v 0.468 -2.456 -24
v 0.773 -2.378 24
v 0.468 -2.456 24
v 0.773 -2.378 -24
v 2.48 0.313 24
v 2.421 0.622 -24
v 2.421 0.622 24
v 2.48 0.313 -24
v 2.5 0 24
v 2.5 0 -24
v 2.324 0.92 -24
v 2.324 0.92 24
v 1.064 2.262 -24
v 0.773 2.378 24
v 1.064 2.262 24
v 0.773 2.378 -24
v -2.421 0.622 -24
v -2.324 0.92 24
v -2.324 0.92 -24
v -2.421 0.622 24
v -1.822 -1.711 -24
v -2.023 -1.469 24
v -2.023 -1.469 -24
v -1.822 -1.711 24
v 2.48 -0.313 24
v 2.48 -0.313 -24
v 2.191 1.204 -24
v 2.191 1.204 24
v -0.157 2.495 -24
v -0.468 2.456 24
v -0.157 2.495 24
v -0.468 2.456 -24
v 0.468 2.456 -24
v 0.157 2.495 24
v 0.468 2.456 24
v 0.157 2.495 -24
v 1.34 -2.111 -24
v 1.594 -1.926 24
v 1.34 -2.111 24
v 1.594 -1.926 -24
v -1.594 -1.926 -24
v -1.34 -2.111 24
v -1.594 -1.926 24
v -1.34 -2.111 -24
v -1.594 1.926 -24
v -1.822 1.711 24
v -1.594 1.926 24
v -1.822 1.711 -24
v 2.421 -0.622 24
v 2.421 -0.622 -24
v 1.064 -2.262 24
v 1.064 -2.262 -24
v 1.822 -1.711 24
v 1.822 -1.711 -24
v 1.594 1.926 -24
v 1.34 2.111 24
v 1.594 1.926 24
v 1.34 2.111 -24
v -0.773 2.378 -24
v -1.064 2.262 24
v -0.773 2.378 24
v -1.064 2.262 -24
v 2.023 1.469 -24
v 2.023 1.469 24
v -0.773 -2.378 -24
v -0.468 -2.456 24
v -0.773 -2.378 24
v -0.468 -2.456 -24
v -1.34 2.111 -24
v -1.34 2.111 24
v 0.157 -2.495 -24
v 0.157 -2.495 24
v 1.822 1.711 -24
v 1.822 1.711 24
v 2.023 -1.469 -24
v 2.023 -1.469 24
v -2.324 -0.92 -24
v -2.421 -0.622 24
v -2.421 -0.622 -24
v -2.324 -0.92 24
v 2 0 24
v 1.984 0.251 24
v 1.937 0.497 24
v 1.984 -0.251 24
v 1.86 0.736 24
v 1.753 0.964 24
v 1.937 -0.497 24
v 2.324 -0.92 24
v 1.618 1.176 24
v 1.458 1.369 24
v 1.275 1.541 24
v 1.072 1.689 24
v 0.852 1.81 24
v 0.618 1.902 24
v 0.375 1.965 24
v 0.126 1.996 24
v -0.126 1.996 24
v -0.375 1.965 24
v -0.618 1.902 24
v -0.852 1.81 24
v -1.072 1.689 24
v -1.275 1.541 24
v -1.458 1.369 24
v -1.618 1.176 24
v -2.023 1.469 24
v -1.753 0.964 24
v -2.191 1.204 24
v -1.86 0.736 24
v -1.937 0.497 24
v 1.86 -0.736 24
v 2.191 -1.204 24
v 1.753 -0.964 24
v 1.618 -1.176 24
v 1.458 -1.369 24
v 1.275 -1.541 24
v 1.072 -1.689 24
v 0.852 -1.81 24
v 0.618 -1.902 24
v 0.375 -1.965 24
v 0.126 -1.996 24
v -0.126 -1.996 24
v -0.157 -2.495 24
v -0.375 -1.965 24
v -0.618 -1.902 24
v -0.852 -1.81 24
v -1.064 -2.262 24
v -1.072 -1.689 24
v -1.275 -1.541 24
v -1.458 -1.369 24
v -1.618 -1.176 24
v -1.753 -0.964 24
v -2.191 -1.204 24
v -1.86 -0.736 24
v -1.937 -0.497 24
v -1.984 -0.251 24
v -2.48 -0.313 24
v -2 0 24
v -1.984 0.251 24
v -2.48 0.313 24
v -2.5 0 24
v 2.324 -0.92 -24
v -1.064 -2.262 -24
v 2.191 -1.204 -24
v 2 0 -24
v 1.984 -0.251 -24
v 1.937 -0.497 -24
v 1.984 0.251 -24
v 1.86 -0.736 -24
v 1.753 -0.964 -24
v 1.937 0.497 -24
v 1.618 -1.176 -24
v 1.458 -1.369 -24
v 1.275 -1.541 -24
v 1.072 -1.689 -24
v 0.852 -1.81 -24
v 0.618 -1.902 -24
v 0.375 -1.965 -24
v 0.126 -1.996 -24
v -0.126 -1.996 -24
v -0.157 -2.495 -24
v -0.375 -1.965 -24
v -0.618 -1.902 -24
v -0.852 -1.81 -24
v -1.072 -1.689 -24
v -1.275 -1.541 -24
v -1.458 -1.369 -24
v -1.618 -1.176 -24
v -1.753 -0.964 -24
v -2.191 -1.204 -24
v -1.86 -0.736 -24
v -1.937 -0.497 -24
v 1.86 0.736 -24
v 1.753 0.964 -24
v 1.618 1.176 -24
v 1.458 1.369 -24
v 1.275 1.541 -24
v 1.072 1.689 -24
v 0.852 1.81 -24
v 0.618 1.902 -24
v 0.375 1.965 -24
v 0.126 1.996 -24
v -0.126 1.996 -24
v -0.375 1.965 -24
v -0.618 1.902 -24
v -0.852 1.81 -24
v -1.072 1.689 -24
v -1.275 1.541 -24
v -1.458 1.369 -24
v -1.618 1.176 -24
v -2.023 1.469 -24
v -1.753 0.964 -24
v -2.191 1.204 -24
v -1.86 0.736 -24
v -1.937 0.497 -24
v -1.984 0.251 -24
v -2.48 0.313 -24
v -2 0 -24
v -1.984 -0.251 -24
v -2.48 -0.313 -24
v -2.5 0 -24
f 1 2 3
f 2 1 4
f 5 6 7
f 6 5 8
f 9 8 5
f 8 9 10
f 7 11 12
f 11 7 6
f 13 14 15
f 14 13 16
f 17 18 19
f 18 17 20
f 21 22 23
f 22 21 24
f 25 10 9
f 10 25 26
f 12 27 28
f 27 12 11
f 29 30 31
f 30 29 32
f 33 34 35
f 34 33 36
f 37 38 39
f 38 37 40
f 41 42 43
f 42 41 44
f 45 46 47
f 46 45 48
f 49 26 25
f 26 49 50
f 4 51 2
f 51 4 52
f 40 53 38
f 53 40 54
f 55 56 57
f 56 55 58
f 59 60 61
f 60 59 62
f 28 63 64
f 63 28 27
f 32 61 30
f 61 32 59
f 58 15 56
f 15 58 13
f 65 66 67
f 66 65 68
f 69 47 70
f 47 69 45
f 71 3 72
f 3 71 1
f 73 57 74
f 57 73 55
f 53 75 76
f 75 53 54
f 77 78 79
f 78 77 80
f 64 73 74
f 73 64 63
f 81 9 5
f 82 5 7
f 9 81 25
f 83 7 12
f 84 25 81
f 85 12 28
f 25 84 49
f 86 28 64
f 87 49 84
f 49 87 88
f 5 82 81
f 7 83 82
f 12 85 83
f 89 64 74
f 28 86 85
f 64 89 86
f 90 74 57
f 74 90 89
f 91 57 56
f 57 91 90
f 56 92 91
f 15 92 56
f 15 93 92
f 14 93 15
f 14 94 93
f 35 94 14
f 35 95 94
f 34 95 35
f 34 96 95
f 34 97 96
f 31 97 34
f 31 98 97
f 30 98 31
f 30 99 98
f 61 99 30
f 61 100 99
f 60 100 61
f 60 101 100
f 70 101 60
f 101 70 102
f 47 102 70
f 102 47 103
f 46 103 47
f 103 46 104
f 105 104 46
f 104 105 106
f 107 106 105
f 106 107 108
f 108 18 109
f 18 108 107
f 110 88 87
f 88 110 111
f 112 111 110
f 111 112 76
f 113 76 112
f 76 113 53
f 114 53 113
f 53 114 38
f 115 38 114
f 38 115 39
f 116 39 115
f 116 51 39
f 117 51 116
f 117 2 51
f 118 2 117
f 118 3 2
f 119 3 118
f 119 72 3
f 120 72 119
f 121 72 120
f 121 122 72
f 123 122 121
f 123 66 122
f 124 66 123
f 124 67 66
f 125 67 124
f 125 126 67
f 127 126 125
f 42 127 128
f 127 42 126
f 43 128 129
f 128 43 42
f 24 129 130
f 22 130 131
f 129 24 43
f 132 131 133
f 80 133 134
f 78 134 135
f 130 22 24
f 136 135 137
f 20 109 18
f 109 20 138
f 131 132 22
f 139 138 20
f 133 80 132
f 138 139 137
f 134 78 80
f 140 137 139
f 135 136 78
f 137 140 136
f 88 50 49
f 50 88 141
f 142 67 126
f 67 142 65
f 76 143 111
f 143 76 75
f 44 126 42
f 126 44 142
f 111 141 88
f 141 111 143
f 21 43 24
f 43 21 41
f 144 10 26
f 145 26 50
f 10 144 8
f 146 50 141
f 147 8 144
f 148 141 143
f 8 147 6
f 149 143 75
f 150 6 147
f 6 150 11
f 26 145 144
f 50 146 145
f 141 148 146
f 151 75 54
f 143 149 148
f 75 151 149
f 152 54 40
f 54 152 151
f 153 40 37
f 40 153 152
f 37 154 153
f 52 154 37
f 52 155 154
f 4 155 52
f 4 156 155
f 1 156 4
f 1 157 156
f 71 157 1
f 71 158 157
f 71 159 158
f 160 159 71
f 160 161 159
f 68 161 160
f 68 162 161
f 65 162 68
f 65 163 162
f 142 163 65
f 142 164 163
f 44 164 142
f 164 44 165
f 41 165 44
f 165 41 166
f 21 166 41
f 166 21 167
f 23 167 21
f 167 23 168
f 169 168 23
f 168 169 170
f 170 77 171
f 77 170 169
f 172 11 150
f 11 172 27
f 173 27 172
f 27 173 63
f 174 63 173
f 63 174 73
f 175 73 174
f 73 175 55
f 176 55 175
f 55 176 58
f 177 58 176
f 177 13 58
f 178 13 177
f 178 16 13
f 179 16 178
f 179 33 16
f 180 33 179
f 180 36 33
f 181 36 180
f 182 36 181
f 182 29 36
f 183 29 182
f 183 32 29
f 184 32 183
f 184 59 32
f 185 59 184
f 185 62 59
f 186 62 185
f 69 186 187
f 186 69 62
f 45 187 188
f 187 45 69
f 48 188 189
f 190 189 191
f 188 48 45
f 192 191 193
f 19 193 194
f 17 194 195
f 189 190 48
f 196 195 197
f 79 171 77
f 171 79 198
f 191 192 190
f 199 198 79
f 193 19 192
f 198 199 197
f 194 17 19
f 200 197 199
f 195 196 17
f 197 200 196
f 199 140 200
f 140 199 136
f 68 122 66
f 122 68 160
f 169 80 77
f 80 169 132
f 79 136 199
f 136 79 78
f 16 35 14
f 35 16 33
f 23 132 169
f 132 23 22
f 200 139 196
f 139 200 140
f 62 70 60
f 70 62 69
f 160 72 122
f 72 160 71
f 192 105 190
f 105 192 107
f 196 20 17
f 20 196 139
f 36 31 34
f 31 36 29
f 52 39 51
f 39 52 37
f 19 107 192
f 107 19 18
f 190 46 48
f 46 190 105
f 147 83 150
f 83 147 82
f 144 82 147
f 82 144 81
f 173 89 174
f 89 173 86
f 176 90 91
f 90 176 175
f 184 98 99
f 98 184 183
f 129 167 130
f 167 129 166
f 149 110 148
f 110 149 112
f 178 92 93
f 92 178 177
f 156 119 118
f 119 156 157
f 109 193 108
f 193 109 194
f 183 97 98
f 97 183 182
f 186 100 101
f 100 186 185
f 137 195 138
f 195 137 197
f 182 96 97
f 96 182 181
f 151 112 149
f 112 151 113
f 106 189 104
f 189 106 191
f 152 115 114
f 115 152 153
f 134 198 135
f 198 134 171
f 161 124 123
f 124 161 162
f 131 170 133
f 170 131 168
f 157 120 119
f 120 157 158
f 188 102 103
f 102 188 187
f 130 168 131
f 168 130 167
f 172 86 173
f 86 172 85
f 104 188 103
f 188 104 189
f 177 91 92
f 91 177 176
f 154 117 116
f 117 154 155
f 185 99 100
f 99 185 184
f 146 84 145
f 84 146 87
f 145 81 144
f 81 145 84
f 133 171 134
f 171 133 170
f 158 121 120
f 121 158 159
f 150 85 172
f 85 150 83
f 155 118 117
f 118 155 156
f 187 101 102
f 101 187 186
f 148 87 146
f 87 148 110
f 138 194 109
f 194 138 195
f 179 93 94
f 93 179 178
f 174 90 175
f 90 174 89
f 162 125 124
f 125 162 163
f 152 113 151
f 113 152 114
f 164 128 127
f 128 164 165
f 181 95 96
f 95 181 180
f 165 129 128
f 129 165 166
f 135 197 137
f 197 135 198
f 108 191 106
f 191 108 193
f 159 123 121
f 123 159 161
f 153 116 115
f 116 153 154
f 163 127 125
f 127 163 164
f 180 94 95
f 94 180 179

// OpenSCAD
$fn = 50;


difference() {
	union() {
		translate(v = [0, 0, -24.0000000000]) {
			cylinder(h = 48, r = 2.5000000000);
		}
	}
	union() {
		translate(v = [0, 0, -100.0000000000]) {
			cylinder(h = 200, r = 2.0000000000);
		}
	}
}
